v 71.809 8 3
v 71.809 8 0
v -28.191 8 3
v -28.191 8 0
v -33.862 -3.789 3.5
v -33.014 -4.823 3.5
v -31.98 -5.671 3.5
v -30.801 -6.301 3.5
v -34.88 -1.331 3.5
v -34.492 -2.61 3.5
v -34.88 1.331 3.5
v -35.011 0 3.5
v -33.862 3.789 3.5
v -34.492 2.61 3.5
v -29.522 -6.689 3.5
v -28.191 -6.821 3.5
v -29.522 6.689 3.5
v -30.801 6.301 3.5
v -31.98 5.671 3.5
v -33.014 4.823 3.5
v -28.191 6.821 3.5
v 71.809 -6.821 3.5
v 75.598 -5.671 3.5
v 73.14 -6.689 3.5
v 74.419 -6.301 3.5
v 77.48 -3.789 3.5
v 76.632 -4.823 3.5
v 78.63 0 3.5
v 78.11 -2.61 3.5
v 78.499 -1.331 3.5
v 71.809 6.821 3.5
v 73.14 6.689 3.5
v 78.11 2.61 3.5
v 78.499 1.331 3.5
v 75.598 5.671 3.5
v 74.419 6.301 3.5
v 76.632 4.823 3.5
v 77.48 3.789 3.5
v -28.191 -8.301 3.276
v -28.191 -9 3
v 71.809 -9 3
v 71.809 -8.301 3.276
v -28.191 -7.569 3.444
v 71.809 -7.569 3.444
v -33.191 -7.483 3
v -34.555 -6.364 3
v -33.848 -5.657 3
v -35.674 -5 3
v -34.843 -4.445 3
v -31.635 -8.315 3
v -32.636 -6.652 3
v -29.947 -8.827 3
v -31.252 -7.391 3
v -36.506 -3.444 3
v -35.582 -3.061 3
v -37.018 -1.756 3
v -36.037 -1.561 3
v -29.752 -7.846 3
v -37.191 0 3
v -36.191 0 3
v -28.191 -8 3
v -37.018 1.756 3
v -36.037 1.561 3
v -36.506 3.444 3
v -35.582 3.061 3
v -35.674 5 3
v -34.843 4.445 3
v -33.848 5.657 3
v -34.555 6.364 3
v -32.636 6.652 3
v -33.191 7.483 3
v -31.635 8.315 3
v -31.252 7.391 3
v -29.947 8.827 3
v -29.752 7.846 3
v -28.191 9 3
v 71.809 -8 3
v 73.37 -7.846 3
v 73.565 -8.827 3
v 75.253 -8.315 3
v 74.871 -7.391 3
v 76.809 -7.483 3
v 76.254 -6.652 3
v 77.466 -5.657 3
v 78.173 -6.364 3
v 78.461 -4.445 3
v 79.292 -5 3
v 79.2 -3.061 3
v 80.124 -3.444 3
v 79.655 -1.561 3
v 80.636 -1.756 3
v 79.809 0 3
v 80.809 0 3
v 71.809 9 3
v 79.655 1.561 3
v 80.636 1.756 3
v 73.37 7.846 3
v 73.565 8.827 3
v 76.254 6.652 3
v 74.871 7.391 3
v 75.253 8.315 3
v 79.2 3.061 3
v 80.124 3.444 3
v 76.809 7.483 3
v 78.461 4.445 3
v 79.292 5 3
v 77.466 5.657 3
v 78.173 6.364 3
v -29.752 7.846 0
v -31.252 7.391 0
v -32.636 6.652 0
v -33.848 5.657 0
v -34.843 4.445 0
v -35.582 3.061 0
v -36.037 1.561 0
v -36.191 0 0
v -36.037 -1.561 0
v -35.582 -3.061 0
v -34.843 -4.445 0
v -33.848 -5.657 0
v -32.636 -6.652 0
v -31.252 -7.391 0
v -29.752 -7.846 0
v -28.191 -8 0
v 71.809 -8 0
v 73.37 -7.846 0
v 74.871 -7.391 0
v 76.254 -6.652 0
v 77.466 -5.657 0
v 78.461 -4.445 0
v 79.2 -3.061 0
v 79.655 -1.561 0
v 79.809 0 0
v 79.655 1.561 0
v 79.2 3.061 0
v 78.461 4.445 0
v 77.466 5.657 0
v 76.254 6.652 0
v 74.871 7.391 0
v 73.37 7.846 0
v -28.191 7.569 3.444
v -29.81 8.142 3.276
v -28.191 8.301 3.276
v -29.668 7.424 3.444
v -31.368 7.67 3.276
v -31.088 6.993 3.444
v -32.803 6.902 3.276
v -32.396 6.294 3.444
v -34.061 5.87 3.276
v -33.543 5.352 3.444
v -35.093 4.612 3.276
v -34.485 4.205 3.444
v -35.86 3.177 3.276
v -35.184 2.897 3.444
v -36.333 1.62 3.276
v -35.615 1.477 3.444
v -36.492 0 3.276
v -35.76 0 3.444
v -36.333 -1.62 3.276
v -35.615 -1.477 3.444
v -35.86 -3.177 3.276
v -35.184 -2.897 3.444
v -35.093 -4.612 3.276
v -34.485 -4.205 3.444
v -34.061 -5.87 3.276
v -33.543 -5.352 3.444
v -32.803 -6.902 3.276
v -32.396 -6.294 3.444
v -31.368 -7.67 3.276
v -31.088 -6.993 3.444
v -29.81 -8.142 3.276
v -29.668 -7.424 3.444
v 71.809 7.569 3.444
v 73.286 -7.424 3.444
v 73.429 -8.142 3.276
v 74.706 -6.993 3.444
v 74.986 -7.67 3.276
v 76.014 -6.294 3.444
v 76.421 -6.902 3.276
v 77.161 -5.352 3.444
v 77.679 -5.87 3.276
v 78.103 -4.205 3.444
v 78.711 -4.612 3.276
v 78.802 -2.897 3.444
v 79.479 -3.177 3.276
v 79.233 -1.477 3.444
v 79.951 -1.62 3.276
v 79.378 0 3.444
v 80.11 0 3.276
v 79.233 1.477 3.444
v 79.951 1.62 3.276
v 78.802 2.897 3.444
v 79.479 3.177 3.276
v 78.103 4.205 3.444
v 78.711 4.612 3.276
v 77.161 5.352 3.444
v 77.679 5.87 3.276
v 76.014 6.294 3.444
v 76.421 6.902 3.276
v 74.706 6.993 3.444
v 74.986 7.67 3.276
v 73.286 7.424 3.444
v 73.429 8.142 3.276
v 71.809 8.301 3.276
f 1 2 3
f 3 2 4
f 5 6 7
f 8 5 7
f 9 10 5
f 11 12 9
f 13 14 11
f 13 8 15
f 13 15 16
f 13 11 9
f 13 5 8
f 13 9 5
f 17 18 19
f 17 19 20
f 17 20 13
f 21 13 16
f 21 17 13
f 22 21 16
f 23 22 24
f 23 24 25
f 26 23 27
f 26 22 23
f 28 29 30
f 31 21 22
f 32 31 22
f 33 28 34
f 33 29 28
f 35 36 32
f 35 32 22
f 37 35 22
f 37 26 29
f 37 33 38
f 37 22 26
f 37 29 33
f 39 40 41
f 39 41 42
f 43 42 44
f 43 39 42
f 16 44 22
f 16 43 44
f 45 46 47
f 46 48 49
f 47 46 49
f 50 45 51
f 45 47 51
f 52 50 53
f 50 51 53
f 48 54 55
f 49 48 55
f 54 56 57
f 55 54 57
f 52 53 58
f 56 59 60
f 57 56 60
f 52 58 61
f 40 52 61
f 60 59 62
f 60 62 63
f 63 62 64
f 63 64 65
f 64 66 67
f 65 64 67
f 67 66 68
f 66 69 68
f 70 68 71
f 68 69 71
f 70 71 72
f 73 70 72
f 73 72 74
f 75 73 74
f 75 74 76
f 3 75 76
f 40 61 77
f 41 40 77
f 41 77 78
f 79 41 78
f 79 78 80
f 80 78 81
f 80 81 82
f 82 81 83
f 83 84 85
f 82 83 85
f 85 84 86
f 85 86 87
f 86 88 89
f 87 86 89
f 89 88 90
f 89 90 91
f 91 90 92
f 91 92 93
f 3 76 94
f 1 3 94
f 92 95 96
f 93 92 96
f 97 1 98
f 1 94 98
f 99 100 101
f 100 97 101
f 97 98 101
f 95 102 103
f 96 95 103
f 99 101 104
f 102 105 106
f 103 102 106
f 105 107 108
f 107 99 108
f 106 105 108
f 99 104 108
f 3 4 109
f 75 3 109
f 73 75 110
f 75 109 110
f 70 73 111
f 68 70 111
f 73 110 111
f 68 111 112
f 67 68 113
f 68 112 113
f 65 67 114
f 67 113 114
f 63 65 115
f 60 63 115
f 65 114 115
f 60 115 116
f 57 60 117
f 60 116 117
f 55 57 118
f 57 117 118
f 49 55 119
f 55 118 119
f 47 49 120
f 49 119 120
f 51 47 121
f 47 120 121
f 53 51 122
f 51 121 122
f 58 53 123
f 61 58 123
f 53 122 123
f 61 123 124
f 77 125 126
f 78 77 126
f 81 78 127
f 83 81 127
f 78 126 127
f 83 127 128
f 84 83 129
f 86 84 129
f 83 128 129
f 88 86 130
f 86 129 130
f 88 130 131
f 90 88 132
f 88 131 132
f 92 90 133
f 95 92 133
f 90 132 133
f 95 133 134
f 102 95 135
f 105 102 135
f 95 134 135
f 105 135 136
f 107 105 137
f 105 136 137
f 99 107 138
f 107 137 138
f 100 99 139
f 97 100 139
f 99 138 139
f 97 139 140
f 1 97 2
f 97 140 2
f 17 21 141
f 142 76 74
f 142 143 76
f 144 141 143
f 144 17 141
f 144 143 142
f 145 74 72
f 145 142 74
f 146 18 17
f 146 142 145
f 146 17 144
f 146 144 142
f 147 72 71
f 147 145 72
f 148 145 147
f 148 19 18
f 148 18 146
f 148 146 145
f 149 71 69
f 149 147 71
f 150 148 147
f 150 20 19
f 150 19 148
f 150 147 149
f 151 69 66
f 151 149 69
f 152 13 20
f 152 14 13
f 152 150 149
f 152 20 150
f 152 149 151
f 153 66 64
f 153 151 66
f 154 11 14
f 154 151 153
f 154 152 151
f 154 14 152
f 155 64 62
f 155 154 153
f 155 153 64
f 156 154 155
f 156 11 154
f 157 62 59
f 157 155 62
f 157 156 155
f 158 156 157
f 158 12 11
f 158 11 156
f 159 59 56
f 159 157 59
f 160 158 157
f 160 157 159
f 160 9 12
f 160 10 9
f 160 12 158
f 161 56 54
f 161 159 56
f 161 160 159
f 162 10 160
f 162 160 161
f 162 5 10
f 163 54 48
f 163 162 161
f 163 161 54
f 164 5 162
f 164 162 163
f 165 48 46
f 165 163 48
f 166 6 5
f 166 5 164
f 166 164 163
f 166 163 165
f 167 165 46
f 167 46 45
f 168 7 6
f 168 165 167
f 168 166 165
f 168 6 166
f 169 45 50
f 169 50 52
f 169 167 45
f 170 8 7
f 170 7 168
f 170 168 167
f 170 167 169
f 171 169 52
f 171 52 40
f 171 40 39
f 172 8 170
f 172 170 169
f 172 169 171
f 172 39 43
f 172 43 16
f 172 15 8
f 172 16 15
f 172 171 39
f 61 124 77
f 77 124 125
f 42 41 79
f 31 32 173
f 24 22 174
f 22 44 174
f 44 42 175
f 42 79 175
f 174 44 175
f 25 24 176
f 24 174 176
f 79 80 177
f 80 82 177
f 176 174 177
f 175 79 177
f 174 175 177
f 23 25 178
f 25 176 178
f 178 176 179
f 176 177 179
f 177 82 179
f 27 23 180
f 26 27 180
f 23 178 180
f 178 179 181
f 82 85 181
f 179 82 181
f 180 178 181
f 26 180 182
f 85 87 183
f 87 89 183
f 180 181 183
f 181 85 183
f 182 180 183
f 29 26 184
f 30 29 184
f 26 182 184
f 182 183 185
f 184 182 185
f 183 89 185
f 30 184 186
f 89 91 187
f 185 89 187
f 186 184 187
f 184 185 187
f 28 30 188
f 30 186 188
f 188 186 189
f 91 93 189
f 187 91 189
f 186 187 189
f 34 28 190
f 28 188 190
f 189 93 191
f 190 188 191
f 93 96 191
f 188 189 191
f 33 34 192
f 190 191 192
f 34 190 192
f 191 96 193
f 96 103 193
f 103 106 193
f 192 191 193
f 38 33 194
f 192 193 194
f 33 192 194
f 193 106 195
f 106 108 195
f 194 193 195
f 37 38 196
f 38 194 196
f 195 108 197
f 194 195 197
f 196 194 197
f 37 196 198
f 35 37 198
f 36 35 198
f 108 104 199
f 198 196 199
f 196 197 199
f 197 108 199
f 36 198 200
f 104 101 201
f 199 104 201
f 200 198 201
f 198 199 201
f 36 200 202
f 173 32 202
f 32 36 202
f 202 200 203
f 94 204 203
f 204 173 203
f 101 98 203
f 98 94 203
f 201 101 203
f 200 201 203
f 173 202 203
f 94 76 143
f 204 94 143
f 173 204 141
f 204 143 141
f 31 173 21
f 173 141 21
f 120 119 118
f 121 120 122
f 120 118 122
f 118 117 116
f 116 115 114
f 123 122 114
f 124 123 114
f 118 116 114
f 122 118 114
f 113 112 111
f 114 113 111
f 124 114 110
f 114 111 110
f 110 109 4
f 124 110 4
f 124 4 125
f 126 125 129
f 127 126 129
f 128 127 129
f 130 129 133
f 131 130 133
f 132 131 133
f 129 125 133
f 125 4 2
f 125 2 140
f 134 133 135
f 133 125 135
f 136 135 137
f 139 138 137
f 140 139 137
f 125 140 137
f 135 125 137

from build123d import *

# Parameters (mm, degrees)
F1_DEPTH    = 3
F3_DEPTH    = 0.5
F4_T1_DEPTH = 100
F4_T4_ANGLE = 180
F4_T6_ANGLE = 180


# Not quite as in the source:
# - a fillet or chamfer that OpenCascade refuses, or shapes differently, is made with other operations: its cross-section is extruded or revolved along the edge and cut away or added


with BuildPart() as f1:
    # F0 (on Top) → F1 (new body)
    with BuildSketch(Plane.XY):
        with BuildLine():
            Line((71.8090593611, 7.9999995343), (-28.1909406389, 7.9999995343))
            ThreePointArc((-28.1909406389, 7.9999995343), (-36.1909406389, -4.657e-07), (-28.1909406389, -8.0000004657))
            Line((-28.1909406389, -8.0000004657), (71.8090593611, -8.0000004657))
            ThreePointArc((71.8090593611, -8.0000004657), (79.8090593611, -4.657e-07), (71.8090593611, 7.9999995343))
        make_face()
    extrude(amount=F1_DEPTH)

    # F2 (on face) → F3 (join)
    with BuildSketch(Plane.XY.offset(3)):
        with BuildLine():
            Line((71.8090593611, 8.9999995343), (-28.1909406389, 8.9999995343))
            ThreePointArc((-28.1909406389, 8.9999995343), (-37.1909406389, -4.657e-07), (-28.1909406389, -9.0000004657))
            Line((-28.1909406389, -9.0000004657), (71.8090593611, -9.0000004657))
            ThreePointArc((71.8090593611, -9.0000004657), (80.8090593611, -4.657e-07), (71.8090593611, 8.9999995343))
        make_face()
        with BuildLine():
            Line((-28.1909406389, 7.9999995343), (71.8090593611, 7.9999995343))
            ThreePointArc((71.8090593611, 7.9999995343), (79.8090593611, -4.657e-07), (71.8090593611, -8.0000004657))
            Line((71.8090593611, -8.0000004657), (-28.1909406389, -8.0000004657))
            ThreePointArc((-28.1909406389, -8.0000004657), (-36.1909406389, -4.657e-07), (-28.1909406389, 7.9999995343))
        make_face(mode=Mode.SUBTRACT)
        with BuildLine():
            ThreePointArc((71.8090593611, -8.0000004657), (79.8090593611, -4.657e-07), (71.8090593611, 7.9999995343))
            Line((71.8090593611, 7.9999995343), (-28.1909406389, 7.9999995343))
            ThreePointArc((-28.1909406389, 7.9999995343), (-36.1909406389, -4.657e-07), (-28.1909406389, -8.0000004657))
            Line((-28.1909406389, -8.0000004657), (71.8090593611, -8.0000004657))
        make_face()
    extrude(amount=F3_DEPTH)

    # F4: fillet of radius 5 on 4 edges, made by hand

    # F4_s2 → F4_t1 (cut)
    with BuildSketch(Plane.YZ.offset(-28.1909406389)):
        with BuildLine():
            ThreePointArc((-9.0000004657, 3), (-7.9385849826, 3.3733971724), (-6.8205509939, 3.5))
            Line((-6.8205509939, 3.5), (-9.0000004657, 3.5))
            Line((-9.0000004657, 3.5), (-9.0000004657, 3))
        make_face()
        with BuildLine():
            ThreePointArc((8.9999995343, 3), (7.9385840513, 3.3733971724), (6.8205500626, 3.5))
            Line((6.8205500626, 3.5), (8.9999995343, 3.5))
            Line((8.9999995343, 3.5), (8.9999995343, 3))
        make_face()
    extrude(amount=F4_T1_DEPTH, mode=Mode.SUBTRACT)

    # F4_s3 → F4_t4 (revolve, cut)
    with BuildSketch(Plane.YZ.offset(-28.1909406389)):
        with BuildLine():
            ThreePointArc((8.9999995343, 3), (7.9385840513, 3.3733971724), (6.8205500626, 3.5))
            Line((6.8205500626, 3.5), (8.9999995343, 3.5))
            Line((8.9999995343, 3.5), (8.9999995343, 3))
        make_face()
    revolve(axis=Axis((-28.1909406389, -4.657e-07, 3.5), (0, 0, 1)), revolution_arc=F4_T4_ANGLE, mode=Mode.SUBTRACT)

    # F4_s5 → F4_t6 (revolve, cut)
    with BuildSketch(Plane.YZ.offset(71.8090593611)):
        with BuildLine():
            ThreePointArc((-6.8205509939, 3.5), (-7.9385849826, 3.3733971724), (-9.0000004657, 3))
            Line((-9.0000004657, 3), (-9.0000004657, 3.5))
            Line((-9.0000004657, 3.5), (-6.8205509939, 3.5))
        make_face()
    revolve(axis=Axis((71.8090593611, -4.657e-07, 3.5), (0, 0, 1)), revolution_arc=F4_T6_ANGLE, mode=Mode.SUBTRACT)


solid = f1.part
